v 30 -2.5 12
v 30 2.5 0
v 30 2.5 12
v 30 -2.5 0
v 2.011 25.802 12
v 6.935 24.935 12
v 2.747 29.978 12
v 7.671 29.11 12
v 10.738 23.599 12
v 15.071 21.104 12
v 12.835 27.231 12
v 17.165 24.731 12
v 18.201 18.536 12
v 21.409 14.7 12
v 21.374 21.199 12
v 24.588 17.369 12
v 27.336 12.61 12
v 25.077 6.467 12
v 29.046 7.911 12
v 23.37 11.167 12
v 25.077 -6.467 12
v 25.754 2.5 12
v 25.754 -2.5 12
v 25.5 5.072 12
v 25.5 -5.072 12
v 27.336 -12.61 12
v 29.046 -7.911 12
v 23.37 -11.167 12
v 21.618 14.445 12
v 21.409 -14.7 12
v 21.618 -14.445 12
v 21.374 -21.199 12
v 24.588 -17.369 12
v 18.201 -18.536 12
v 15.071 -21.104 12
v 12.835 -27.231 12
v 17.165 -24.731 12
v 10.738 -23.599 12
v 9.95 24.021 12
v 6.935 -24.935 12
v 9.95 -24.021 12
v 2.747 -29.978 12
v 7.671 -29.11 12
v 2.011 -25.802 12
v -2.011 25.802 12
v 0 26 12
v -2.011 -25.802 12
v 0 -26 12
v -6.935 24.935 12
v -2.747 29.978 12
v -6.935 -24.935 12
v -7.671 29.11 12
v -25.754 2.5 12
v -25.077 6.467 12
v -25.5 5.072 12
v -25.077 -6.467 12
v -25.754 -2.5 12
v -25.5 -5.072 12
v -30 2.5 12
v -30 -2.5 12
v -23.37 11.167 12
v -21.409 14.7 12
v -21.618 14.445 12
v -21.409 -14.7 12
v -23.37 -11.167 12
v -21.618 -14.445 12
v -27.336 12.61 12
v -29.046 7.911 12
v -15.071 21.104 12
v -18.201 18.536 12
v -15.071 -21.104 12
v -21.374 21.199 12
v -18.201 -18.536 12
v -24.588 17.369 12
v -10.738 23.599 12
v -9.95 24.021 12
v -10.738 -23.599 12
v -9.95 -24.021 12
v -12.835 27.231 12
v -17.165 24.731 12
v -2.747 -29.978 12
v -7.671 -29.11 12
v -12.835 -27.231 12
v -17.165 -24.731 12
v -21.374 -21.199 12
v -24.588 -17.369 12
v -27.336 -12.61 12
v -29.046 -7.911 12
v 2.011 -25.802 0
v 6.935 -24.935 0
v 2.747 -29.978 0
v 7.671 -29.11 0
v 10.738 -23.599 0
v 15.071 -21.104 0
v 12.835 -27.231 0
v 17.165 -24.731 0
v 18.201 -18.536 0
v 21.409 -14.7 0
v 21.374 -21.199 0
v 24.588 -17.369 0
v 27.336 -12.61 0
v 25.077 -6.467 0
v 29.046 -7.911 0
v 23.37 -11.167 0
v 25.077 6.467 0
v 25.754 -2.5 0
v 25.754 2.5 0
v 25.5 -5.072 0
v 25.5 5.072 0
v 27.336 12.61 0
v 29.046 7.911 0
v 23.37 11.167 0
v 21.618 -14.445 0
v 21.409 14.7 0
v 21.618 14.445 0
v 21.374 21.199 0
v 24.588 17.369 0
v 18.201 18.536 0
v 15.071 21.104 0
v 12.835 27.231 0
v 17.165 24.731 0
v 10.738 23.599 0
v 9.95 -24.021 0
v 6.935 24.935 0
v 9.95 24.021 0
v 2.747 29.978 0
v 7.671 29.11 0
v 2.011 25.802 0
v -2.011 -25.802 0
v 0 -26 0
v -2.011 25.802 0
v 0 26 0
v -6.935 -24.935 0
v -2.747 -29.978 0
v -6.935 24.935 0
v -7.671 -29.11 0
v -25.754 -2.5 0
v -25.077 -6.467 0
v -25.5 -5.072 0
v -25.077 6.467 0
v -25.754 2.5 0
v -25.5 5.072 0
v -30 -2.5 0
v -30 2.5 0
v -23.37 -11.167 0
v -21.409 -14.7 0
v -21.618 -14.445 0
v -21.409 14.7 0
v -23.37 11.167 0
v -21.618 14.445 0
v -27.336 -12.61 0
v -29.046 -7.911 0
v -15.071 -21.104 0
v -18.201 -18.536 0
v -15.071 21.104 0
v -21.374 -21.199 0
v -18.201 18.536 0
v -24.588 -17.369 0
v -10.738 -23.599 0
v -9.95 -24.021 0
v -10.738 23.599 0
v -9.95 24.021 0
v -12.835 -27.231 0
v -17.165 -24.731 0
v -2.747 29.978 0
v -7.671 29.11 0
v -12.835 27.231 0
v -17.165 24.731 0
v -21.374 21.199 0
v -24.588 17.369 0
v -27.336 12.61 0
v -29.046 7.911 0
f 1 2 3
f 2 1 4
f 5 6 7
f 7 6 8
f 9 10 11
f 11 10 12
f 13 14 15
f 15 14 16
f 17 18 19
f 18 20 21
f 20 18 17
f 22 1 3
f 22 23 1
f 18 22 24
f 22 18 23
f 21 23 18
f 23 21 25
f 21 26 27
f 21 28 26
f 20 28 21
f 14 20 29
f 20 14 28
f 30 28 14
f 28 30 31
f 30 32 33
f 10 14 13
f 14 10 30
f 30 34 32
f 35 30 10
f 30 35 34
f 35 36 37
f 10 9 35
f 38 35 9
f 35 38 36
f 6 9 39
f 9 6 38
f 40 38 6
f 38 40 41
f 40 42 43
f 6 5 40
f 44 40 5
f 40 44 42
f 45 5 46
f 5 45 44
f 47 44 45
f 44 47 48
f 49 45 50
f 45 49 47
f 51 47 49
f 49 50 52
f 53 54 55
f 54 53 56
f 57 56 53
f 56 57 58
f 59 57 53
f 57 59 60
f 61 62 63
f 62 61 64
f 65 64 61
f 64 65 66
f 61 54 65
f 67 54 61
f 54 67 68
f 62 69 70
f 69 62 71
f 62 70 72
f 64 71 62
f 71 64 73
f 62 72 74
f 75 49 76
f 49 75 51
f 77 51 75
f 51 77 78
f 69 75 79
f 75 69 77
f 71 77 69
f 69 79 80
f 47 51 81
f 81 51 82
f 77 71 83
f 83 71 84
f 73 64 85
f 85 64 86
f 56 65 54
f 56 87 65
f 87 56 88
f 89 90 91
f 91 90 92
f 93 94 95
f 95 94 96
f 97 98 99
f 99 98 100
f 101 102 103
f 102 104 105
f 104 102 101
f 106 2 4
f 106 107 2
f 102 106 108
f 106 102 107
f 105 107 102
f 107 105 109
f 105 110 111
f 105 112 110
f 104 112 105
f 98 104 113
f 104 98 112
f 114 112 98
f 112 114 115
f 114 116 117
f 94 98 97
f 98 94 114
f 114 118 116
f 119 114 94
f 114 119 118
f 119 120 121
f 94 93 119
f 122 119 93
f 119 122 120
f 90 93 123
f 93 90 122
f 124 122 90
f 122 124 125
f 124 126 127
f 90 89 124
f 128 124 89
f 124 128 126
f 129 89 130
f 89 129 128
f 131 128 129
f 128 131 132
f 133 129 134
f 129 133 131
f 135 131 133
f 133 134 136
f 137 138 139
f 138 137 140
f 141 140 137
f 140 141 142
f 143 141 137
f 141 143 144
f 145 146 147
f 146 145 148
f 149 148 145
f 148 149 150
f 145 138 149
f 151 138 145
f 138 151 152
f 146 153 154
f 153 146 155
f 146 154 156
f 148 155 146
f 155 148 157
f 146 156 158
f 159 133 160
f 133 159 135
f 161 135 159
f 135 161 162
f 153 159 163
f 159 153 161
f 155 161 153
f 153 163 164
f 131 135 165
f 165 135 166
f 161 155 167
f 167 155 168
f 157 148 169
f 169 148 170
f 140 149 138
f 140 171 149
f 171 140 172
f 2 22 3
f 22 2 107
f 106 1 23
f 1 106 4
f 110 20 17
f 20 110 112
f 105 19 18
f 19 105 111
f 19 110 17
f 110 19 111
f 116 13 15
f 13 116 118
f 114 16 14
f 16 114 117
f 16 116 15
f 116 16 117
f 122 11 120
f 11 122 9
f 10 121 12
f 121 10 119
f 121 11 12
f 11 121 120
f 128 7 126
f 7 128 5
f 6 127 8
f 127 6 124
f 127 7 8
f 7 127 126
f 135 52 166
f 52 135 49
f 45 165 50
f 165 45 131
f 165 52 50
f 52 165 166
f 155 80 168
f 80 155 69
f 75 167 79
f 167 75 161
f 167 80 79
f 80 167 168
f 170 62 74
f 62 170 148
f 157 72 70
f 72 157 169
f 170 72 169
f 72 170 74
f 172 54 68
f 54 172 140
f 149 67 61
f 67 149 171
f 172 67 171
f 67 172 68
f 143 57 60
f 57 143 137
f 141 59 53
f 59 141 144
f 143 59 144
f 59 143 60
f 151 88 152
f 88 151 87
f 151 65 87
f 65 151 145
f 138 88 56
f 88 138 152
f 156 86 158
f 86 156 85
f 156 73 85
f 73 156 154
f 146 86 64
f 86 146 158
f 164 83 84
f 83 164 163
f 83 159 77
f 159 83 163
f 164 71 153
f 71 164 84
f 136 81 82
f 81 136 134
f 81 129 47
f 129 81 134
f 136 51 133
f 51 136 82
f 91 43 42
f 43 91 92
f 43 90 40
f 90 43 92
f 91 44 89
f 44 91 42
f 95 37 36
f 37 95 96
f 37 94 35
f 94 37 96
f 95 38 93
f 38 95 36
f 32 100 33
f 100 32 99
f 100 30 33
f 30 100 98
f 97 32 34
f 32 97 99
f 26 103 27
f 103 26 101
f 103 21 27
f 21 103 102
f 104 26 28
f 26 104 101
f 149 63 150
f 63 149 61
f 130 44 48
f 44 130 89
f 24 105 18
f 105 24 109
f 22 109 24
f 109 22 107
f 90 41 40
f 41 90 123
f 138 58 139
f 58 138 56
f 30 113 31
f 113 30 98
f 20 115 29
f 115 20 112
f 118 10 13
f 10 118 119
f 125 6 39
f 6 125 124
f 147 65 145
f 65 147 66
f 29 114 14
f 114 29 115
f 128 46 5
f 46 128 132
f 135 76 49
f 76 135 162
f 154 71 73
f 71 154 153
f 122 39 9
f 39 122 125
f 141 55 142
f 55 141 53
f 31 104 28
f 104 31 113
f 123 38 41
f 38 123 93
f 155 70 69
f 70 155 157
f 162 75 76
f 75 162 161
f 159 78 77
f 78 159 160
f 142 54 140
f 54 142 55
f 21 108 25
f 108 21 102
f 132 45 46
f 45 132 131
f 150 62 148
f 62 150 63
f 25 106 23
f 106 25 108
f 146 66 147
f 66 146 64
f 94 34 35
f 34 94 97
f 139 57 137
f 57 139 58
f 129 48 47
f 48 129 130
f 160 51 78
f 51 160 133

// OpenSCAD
$fn = 32;

// ----------------------------------------------------------------------
// Spur blank: plain gear blank
// ----------------------------------------------------------------------

// --- parameters (mm) ---
disc_r = 26;              // blank root radius
disc_t = 12;              // blank thickness
n_teeth = 18;             // stub tooth count
tooth_w = 5;              // tooth width at the root
tooth_h = 4;              // tooth height above the root

out_r = disc_r + tooth_h;  // tip radius
bbox_x = 60.0;  // measured width over the teeth
bbox_y = 59.96;  // measured depth over the teeth

union() {
  cylinder(r = disc_r, h = disc_t);
  for (i = [0 : n_teeth - 1])
    rotate([0, 0, i * 360 / n_teeth])
      translate([disc_r - 1, -tooth_w / 2, 0])
        cube([tooth_h + 1, tooth_w, disc_t]);
}
